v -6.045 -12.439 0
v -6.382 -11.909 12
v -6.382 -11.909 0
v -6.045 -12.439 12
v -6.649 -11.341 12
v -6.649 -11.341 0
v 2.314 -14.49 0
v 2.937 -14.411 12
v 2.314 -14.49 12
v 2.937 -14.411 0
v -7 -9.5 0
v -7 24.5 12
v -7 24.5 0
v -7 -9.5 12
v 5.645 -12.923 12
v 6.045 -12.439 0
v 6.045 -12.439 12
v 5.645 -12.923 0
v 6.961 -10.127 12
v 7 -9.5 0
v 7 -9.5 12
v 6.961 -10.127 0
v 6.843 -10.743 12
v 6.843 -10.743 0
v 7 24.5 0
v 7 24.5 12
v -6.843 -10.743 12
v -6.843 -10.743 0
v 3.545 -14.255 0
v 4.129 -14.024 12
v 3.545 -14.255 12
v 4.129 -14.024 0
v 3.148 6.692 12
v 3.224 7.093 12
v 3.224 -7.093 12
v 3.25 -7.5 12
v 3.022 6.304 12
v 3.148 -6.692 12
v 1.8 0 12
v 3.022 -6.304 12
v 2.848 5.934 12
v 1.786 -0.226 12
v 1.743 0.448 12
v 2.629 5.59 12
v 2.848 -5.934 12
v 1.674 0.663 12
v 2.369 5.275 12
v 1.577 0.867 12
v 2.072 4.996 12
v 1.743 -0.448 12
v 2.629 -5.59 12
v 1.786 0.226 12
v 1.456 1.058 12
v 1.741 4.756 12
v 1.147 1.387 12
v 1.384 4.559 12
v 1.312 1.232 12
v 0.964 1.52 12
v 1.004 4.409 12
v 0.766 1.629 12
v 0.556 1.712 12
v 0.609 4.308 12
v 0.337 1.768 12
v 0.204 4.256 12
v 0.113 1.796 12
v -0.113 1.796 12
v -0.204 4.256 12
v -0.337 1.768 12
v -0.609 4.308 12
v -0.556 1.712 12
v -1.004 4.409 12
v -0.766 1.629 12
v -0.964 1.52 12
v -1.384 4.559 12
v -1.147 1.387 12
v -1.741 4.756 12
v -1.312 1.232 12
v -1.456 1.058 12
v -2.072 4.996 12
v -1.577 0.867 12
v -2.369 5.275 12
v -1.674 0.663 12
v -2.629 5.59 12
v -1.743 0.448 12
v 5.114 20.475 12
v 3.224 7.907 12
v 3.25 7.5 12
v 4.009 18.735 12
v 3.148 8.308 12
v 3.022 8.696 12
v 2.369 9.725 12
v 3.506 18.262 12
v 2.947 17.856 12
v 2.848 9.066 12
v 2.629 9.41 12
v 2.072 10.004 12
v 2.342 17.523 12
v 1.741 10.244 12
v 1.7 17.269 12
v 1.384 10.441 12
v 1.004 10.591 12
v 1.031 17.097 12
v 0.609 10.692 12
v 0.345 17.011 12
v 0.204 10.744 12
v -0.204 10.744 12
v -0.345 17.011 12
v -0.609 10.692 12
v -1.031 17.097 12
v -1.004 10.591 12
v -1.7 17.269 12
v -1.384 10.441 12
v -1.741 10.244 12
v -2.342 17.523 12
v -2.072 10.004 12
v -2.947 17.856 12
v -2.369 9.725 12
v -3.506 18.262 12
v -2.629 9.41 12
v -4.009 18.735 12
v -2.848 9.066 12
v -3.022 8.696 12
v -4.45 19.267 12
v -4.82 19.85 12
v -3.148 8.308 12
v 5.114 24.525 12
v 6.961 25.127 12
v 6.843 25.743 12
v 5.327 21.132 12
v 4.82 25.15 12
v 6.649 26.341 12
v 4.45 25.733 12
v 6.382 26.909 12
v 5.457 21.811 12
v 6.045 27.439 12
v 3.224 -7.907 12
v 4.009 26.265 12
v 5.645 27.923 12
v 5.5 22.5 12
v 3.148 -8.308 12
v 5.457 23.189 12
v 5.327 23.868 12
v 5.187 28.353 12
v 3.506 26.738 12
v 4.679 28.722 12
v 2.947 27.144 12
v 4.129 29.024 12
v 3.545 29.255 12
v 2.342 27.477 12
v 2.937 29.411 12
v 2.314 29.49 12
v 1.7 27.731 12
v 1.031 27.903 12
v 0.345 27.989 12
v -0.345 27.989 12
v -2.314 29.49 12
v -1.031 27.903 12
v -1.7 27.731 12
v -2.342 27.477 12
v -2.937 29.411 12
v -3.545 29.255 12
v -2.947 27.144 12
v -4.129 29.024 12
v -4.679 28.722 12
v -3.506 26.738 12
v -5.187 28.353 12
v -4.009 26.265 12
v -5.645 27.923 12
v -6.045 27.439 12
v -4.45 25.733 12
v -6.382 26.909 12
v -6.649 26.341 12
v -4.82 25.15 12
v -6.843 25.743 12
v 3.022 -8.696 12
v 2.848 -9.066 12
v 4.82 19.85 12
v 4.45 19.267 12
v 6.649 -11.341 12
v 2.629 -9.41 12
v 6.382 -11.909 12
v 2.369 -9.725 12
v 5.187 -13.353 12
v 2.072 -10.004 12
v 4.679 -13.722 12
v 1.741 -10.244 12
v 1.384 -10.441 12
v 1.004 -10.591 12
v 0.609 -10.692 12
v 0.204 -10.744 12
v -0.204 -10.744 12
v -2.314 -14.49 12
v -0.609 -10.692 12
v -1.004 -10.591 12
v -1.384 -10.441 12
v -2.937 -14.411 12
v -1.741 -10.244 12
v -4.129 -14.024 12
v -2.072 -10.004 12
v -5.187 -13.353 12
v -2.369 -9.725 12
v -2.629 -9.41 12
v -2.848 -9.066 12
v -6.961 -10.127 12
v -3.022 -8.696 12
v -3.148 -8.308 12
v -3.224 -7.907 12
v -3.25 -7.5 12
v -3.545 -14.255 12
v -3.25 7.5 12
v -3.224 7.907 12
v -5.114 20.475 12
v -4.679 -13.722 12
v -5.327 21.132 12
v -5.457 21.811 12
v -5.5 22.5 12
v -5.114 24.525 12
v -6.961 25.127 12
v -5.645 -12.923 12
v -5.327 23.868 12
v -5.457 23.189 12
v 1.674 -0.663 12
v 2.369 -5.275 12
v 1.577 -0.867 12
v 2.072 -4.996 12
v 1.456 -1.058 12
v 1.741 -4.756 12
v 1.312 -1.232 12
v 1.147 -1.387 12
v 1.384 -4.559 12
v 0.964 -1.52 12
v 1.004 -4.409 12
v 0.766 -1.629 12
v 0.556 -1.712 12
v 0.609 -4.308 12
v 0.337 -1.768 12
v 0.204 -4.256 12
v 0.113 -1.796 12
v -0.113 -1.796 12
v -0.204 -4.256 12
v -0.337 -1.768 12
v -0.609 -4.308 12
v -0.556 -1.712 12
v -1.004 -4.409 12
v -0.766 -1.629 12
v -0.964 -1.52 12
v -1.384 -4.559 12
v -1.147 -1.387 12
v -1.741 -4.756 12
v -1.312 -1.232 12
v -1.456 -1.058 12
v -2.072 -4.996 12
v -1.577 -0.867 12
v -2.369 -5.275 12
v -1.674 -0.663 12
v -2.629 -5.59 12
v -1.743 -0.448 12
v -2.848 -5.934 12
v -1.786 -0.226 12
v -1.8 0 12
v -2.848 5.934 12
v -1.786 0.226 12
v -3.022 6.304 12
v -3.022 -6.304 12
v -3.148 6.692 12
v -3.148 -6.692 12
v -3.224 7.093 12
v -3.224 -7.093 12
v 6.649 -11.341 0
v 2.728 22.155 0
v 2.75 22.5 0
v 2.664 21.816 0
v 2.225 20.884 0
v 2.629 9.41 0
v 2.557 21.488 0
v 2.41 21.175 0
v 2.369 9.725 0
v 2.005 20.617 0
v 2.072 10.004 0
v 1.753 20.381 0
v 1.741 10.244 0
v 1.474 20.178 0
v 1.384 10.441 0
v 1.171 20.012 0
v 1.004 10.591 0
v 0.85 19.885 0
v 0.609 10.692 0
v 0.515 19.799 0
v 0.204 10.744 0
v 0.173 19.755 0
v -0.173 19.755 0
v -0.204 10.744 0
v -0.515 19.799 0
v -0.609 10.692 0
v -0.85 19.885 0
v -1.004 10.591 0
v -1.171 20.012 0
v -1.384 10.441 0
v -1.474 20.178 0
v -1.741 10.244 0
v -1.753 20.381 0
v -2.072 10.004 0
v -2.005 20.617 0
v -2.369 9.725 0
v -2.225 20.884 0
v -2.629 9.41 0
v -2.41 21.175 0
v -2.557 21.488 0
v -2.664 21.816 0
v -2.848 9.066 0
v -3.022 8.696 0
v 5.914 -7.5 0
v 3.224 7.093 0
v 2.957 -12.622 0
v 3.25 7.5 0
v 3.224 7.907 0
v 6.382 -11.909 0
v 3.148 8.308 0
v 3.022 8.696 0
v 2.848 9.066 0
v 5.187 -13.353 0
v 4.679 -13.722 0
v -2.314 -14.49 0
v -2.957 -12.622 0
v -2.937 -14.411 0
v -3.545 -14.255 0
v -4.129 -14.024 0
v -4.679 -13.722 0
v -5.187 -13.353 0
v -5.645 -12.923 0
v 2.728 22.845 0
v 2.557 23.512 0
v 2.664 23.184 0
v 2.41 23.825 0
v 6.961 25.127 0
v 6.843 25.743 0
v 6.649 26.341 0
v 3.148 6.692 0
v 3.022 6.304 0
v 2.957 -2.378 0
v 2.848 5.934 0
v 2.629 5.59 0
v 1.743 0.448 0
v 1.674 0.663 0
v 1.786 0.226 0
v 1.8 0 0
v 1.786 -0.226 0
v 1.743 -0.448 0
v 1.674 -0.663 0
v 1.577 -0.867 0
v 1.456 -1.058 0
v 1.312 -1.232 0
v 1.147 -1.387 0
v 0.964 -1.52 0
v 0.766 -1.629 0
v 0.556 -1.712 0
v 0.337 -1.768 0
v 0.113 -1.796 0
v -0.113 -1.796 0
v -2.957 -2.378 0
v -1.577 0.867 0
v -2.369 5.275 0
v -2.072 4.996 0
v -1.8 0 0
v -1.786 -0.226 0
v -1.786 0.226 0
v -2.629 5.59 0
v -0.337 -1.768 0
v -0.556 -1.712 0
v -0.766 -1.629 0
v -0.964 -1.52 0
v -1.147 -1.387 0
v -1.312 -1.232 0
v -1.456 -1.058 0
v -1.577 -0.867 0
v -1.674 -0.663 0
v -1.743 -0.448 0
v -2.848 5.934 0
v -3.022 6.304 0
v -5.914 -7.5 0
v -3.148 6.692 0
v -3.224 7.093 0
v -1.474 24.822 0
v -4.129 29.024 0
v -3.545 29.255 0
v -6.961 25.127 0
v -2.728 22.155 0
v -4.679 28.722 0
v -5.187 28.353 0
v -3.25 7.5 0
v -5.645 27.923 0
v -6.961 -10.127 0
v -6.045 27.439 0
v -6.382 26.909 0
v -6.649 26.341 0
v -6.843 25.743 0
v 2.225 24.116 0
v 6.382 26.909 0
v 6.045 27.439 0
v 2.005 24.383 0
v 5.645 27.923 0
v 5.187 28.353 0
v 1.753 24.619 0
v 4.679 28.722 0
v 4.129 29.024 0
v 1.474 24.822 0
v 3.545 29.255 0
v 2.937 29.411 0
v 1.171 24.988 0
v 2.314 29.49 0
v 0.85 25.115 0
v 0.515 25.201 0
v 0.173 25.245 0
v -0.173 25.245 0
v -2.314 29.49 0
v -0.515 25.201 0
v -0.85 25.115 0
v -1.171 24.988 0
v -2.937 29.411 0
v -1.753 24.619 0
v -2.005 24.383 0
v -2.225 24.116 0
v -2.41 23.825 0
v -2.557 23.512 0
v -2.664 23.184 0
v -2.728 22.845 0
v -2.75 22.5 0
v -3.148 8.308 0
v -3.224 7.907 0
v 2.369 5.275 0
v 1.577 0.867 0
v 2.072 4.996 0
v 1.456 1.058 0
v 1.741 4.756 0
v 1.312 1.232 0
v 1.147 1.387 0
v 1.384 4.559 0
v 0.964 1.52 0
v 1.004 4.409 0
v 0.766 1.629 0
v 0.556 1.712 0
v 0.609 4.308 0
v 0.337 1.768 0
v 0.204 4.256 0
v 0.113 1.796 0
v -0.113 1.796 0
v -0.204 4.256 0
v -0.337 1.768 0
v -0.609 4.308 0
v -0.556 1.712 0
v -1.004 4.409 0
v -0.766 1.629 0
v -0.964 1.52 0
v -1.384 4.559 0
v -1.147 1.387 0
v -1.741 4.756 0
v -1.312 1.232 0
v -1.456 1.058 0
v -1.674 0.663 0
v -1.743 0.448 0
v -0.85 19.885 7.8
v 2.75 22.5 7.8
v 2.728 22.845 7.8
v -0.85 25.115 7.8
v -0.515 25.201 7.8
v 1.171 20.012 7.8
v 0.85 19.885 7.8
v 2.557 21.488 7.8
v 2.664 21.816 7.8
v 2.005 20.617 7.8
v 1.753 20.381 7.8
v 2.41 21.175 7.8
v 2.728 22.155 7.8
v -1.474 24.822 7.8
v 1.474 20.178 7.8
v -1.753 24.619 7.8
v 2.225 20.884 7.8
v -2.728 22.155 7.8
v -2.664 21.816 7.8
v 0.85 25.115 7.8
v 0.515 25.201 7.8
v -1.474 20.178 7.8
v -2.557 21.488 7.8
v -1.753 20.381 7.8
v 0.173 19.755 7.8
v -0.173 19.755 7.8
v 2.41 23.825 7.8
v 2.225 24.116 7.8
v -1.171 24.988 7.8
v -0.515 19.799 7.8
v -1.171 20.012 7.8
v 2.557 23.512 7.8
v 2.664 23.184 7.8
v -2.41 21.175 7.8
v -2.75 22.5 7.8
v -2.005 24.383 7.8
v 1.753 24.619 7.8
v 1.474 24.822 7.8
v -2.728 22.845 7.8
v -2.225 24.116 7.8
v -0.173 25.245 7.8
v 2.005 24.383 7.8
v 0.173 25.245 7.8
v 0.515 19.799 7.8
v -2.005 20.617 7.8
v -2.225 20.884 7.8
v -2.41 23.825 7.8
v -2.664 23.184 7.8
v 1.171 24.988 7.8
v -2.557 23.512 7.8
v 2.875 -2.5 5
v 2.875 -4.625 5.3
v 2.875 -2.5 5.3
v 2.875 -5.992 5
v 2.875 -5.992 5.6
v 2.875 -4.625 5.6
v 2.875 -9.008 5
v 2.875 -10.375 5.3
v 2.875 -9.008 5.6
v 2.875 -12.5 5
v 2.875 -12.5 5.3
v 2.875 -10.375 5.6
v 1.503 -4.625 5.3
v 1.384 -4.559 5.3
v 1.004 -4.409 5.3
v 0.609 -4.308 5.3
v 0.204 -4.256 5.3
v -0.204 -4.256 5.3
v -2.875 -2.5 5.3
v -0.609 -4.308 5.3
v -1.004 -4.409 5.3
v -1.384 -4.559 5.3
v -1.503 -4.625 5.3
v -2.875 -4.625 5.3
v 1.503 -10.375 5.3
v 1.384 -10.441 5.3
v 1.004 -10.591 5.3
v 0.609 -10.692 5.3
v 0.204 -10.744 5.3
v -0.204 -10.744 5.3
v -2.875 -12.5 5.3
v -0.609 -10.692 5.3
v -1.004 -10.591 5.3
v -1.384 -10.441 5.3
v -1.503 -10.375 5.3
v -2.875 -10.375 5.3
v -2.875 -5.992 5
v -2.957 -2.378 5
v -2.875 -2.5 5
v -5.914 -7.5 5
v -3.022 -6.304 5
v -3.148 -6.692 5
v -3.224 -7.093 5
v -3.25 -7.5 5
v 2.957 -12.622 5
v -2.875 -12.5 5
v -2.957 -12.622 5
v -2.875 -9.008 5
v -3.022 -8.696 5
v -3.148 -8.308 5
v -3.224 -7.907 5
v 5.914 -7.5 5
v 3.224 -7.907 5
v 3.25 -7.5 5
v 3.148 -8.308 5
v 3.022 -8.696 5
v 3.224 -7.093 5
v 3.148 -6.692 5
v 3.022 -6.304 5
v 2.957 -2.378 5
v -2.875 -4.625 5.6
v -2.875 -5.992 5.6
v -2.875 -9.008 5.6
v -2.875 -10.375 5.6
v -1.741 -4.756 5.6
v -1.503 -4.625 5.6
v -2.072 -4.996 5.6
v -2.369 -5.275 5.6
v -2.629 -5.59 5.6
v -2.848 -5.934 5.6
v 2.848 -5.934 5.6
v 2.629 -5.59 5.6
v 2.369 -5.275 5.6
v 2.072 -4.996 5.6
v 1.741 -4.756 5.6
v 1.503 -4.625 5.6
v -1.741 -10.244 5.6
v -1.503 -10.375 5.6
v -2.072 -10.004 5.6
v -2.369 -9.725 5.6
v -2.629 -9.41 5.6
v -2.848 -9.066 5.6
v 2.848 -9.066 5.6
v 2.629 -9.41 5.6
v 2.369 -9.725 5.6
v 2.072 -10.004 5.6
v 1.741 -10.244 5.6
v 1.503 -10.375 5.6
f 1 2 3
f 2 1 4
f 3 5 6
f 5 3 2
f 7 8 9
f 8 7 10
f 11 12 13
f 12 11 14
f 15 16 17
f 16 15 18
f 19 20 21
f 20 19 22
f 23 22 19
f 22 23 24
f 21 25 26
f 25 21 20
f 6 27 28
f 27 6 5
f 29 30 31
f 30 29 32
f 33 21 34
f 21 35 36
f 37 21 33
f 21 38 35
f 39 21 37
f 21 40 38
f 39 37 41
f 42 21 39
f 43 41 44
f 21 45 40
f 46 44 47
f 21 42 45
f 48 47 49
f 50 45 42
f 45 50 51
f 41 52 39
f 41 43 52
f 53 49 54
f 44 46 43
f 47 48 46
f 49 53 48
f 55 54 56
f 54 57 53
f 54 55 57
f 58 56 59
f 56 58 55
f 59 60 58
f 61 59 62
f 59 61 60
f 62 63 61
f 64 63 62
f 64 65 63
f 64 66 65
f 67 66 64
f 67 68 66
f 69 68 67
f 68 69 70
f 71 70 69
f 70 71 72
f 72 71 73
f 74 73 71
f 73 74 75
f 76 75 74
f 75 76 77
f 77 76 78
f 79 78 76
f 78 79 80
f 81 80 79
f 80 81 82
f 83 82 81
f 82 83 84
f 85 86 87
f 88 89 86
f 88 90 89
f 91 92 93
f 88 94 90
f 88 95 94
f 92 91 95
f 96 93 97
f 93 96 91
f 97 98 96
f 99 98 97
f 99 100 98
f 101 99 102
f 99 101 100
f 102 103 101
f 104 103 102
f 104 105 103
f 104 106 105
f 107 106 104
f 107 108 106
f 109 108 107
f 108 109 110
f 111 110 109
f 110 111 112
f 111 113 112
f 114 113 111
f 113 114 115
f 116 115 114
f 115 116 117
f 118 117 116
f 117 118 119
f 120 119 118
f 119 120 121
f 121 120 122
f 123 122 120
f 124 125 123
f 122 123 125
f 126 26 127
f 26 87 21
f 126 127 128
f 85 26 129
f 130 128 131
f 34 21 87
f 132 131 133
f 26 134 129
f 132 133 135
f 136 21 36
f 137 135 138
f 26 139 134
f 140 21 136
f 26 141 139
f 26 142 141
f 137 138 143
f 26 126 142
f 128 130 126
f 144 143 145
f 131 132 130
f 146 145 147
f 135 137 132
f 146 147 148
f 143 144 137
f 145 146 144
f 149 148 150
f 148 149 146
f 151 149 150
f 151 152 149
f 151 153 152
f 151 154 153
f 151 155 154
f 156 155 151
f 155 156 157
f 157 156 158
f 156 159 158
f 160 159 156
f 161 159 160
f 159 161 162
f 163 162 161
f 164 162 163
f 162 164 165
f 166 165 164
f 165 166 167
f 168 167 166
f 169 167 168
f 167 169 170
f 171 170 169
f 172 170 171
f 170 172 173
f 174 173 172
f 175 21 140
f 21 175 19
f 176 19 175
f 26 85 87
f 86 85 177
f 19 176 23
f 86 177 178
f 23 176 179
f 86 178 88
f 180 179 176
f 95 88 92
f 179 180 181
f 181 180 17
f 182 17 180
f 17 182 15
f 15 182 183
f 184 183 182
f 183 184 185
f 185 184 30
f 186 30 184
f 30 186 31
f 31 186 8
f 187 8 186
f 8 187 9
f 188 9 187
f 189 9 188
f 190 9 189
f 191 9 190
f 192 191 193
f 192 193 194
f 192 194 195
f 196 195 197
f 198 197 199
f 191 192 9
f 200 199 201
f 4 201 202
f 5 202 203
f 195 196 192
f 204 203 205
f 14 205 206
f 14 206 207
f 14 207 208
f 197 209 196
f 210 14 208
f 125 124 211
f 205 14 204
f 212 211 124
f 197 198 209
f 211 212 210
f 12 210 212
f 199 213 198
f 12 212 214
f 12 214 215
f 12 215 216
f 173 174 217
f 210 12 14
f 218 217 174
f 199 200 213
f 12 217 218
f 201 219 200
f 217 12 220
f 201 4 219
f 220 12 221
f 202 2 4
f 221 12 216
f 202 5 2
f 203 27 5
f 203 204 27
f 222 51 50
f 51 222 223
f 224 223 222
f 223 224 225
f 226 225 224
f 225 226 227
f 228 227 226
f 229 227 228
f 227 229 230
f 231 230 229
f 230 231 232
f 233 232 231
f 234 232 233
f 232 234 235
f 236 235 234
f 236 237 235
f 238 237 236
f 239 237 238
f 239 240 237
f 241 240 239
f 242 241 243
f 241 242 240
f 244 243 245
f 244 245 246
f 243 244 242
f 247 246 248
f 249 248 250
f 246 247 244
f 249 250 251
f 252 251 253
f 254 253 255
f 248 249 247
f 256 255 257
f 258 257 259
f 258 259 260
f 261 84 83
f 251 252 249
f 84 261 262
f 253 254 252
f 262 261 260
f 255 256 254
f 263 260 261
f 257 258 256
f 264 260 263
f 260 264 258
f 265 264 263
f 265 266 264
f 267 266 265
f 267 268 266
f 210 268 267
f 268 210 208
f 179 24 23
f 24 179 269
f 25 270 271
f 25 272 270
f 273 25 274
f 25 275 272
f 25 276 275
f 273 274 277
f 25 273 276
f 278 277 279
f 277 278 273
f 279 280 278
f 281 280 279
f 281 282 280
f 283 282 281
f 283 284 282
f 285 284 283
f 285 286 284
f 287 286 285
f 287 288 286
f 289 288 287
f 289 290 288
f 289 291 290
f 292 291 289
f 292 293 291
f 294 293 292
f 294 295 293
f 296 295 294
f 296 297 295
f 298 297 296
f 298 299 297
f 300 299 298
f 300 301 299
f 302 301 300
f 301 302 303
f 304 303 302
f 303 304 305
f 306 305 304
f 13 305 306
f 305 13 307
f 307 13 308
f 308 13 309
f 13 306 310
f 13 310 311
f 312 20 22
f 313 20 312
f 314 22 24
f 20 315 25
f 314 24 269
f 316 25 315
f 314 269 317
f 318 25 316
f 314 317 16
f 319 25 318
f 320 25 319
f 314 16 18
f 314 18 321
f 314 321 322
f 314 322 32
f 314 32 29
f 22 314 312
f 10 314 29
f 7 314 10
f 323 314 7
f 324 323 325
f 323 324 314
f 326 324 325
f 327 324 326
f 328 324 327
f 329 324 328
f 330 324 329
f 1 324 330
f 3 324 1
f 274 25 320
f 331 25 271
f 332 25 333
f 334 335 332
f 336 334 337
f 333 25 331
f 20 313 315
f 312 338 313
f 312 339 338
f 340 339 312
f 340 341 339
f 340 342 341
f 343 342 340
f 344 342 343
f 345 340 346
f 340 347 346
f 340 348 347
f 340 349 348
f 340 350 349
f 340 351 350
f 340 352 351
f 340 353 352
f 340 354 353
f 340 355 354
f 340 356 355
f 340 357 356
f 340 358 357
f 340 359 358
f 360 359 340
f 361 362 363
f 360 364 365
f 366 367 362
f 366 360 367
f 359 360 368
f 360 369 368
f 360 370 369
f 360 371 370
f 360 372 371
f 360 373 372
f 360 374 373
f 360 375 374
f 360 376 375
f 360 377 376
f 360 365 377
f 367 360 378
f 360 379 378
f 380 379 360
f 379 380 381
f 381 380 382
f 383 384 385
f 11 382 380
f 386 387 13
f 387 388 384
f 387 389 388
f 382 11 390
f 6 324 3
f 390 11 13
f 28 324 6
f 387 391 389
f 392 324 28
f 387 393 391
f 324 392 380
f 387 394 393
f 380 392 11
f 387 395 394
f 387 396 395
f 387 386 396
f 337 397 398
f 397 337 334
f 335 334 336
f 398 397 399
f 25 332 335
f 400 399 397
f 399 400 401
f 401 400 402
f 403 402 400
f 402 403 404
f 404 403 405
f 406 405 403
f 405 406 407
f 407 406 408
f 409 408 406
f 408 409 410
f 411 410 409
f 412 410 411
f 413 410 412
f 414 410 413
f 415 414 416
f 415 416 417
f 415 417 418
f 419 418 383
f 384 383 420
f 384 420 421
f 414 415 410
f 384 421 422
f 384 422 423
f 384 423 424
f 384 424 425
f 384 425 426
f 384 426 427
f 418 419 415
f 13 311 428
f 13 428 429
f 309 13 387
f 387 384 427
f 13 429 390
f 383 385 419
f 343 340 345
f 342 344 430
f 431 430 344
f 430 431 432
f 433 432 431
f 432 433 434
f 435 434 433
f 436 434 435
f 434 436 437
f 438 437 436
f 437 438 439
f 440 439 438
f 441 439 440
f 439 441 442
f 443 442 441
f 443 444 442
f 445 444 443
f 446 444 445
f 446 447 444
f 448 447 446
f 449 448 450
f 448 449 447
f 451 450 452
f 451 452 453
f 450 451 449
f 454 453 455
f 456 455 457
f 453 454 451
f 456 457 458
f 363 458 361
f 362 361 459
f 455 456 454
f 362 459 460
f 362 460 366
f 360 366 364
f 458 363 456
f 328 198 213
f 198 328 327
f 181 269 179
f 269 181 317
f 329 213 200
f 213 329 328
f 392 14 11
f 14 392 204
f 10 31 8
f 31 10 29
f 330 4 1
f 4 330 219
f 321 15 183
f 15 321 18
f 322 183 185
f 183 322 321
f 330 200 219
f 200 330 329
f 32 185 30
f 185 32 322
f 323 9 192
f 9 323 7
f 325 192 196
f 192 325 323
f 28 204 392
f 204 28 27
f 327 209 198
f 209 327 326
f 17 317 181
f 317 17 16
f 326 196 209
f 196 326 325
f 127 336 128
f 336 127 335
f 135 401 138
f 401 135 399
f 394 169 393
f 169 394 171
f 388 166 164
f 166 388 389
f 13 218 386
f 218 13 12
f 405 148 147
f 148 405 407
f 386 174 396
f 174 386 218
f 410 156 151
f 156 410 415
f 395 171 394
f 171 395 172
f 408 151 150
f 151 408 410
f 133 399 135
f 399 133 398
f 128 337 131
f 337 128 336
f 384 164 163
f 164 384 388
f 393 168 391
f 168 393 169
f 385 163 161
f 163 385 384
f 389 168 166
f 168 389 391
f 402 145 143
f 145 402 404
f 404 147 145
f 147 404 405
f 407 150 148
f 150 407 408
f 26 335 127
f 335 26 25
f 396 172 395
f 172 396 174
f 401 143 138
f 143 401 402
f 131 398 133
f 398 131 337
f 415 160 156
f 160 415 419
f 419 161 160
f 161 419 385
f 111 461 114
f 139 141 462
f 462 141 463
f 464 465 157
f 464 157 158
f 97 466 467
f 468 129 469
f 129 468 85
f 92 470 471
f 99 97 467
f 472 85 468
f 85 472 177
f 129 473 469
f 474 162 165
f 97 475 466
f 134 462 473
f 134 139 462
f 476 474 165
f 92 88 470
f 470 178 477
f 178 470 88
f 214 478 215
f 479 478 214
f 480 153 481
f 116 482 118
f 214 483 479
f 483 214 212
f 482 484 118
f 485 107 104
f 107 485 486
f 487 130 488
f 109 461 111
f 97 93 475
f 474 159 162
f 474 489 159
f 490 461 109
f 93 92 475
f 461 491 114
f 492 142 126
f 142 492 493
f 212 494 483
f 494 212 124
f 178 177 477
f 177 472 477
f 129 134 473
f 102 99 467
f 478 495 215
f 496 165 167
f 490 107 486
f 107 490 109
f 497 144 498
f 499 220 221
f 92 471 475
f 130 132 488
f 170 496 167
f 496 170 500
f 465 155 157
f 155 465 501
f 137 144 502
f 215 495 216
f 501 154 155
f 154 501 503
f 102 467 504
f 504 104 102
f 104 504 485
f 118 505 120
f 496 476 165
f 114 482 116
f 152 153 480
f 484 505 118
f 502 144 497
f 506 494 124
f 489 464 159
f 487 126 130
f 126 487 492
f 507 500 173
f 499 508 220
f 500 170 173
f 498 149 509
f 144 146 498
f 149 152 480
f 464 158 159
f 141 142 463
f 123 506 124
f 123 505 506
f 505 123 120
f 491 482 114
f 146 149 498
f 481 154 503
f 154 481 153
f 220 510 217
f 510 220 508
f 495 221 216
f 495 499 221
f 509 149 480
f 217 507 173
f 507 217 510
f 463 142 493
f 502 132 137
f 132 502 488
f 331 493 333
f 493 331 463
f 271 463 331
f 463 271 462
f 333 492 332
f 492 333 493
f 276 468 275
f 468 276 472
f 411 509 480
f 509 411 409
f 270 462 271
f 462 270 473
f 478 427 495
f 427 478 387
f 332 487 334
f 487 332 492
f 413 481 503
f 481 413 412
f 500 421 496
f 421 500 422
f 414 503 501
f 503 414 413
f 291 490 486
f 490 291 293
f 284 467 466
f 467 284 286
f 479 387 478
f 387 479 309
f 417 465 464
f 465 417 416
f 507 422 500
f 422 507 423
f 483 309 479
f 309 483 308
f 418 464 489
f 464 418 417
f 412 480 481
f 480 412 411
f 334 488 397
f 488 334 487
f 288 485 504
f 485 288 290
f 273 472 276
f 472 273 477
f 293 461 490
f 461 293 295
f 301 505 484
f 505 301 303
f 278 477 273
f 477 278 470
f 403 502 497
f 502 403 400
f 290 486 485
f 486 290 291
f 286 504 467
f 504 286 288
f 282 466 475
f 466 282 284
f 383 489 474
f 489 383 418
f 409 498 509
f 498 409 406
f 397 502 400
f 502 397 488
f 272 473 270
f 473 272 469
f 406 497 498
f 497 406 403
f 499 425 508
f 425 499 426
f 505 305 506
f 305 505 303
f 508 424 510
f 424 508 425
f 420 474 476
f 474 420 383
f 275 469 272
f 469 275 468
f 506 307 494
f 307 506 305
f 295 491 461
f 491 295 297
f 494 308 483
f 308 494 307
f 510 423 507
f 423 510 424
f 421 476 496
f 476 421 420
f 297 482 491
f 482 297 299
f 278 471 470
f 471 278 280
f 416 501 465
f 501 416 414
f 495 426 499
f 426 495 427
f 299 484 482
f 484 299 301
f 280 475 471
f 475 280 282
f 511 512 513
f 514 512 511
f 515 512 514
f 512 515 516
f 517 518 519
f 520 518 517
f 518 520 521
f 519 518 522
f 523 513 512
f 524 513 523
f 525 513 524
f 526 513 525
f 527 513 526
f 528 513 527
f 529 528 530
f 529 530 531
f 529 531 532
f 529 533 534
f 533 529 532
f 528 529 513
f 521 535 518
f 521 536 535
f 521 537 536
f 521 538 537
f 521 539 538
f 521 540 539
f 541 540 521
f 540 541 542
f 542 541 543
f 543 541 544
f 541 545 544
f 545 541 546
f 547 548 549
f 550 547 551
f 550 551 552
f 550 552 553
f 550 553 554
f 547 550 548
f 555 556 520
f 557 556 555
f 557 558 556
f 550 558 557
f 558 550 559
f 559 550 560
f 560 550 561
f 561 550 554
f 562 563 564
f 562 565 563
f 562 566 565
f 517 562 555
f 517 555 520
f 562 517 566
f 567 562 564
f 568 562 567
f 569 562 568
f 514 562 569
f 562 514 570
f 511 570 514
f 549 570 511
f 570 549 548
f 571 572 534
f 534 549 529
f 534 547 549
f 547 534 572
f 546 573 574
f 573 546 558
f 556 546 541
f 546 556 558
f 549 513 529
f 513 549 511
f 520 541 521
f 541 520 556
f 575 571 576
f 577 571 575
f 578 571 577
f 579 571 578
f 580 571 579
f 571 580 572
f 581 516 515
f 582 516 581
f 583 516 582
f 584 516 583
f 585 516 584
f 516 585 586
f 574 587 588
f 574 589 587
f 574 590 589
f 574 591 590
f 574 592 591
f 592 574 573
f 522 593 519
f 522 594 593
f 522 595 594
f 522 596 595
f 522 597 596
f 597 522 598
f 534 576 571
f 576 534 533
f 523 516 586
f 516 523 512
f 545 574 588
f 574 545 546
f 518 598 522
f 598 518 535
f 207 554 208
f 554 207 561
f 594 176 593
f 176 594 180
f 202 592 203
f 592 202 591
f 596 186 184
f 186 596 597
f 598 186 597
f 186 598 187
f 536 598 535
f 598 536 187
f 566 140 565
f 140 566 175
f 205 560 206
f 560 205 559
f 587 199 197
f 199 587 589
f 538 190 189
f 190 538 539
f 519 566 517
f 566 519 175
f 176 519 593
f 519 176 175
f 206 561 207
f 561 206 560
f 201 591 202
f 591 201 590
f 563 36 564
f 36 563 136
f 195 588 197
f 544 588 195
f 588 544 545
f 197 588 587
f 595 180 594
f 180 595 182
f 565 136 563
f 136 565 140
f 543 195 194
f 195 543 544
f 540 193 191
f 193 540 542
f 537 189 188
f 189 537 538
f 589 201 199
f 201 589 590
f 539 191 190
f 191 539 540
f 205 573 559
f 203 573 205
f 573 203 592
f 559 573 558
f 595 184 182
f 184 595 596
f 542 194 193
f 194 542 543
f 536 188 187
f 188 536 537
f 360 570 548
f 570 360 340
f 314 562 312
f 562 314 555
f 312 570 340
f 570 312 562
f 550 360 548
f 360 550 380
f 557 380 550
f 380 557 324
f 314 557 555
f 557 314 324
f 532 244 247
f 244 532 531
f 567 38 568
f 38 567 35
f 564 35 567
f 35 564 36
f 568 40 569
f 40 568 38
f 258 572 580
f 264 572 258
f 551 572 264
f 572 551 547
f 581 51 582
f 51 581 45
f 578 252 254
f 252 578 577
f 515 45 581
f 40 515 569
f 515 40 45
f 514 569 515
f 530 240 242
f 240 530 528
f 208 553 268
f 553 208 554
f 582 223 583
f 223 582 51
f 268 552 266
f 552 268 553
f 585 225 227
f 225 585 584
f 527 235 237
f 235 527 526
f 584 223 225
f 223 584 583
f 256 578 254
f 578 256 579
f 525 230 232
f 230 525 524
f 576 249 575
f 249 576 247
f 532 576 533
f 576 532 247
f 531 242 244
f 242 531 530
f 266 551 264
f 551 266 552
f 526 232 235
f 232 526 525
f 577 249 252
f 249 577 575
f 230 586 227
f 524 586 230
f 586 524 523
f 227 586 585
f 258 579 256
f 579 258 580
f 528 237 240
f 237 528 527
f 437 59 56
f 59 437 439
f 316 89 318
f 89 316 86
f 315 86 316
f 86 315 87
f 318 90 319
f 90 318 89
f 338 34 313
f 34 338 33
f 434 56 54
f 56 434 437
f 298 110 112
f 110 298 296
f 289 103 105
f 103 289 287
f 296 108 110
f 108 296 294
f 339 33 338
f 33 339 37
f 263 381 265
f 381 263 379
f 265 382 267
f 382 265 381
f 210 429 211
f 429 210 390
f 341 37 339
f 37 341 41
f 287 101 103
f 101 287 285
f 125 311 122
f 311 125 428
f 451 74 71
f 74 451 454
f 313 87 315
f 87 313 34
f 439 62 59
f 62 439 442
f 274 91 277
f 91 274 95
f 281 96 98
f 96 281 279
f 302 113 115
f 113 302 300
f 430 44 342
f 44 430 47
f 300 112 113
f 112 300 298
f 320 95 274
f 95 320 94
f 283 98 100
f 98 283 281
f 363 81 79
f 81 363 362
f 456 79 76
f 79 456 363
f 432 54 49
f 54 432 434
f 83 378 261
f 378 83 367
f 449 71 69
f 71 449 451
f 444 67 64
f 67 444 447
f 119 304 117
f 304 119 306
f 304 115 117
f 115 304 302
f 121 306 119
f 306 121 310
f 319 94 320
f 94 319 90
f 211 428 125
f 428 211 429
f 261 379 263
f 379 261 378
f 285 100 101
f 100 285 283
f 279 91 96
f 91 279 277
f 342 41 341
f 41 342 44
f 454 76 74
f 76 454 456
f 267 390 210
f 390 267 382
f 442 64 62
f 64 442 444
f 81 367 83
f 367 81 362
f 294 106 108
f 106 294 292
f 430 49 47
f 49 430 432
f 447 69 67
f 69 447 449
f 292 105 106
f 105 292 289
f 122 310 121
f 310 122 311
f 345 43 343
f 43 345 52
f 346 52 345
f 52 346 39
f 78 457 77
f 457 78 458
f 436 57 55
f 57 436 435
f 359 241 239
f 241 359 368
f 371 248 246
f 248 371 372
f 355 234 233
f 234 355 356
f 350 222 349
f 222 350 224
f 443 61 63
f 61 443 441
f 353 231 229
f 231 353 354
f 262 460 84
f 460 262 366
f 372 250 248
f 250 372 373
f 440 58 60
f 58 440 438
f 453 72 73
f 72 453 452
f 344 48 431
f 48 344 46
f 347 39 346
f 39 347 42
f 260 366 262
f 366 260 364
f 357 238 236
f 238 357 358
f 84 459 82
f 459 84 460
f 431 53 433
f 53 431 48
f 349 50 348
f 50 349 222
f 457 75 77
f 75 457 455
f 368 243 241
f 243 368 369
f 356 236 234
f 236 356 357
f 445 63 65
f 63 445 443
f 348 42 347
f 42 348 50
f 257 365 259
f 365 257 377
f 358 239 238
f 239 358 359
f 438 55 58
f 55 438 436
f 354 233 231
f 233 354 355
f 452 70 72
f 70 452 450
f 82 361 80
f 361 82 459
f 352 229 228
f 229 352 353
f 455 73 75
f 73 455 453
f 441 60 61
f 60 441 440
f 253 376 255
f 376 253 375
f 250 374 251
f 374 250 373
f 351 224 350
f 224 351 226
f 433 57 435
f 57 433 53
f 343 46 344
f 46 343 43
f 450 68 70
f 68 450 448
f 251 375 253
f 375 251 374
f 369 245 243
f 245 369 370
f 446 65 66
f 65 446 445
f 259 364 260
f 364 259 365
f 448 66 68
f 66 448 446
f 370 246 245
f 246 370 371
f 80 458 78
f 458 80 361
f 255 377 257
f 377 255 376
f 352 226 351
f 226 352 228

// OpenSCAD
$fn = 50;


difference() {
	union() {
		hull() {
			translate(v = [-2.0000000000, 9.5000000000, 0]) {
				cylinder(h = 12, r = 5);
			}
			translate(v = [2.0000000000, 9.5000000000, 0]) {
				cylinder(h = 12, r = 5);
			}
			translate(v = [-2.0000000000, -9.5000000000, 0]) {
				cylinder(h = 12, r = 5);
			}
			translate(v = [2.0000000000, -9.5000000000, 0]) {
				cylinder(h = 12, r = 5);
			}
		}
		translate(v = [0.0000000000, 15.0000000000, 0]) {
			hull() {
				translate(v = [-2.0000000000, 9.5000000000, 0]) {
					cylinder(h = 12, r = 5);
				}
				translate(v = [2.0000000000, 9.5000000000, 0]) {
					cylinder(h = 12, r = 5);
				}
				translate(v = [-2.0000000000, -9.5000000000, 0]) {
					cylinder(h = 12, r = 5);
				}
				translate(v = [2.0000000000, -9.5000000000, 0]) {
					cylinder(h = 12, r = 5);
				}
			}
		}
		translate(v = [0.0000000000, 15.0000000000, 0]) {
			hull() {
				translate(v = [-2.0000000000, 9.5000000000, 0]) {
					cylinder(h = 12, r = 5);
				}
				translate(v = [2.0000000000, 9.5000000000, 0]) {
					cylinder(h = 12, r = 5);
				}
				translate(v = [-2.0000000000, -9.5000000000, 0]) {
					cylinder(h = 12, r = 5);
				}
				translate(v = [2.0000000000, -9.5000000000, 0]) {
					cylinder(h = 12, r = 5);
				}
			}
		}
	}
	union() {
		translate(v = [0.0000000000, 22.5000000000, 12]) {
			rotate(a = [0, 0, 0]) {
				difference() {
					union() {
						#translate(v = [0, 0, -12.0000000000]) {
							cylinder(h = 12, r = 2.2500000000);
						}
						#translate(v = [0, 0, -4.2000000000]) {
							cylinder(h = 4.2000000000, r1 = 2.7500000000, r2 = 5.5000000000);
						}
						#translate(v = [0, 0, -12.0000000000]) {
							cylinder(h = 12, r = 2.7500000000);
						}
						#translate(v = [0, 0, -12.0000000000]) {
							cylinder(h = 12, r = 2.2500000000);
						}
					}
					union();
				}
			}
		}
		translate(v = [0.0000000000, 22.5000000000, 12]) {
			rotate(a = [0, 0, 0]) {
				difference() {
					union() {
						#translate(v = [0, 0, -12.0000000000]) {
							cylinder(h = 12, r = 2.2500000000);
						}
						#translate(v = [0, 0, -4.2000000000]) {
							cylinder(h = 4.2000000000, r1 = 2.7500000000, r2 = 5.5000000000);
						}
						#translate(v = [0, 0, -12.0000000000]) {
							cylinder(h = 12, r = 2.7500000000);
						}
						#translate(v = [0, 0, -12.0000000000]) {
							cylinder(h = 12, r = 2.2500000000);
						}
					}
					union();
				}
			}
		}
		translate(v = [0.0000000000, -7.5000000000, 0]) {
			rotate(a = [0, 0, 0]) {
				difference() {
					union() {
						#translate(v = [-2.8750000000, -5.0000000000, -0.3000000000]) {
							cube(size = [5.7500000000, 10, 0.3000000000]);
						}
						#translate(v = [-2.8750000000, -2.8750000000, -0.6000000000]) {
							cube(size = [5.7500000000, 5.7500000000, 0.3000000000]);
						}
						#translate(v = [-2.8750000000, -5.0000000000, 5]) {
							cube(size = [5.7500000000, 10, 0.3000000000]);
						}
						#translate(v = [-2.8750000000, -2.8750000000, 5.3000000000]) {
							cube(size = [5.7500000000, 5.7500000000, 0.3000000000]);
						}
						#translate(v = [0, 0, -100.0000000000]) {
							cylinder(h = 200, r = 3.2500000000);
						}
						#linear_extrude(height = 5) {
							polygon(points = [[5.9142500000, 0.0000000000], [2.9571250000, 5.1218907443], [-2.9571250000, 5.1218907443], [-5.9142500000, 0.0000000000], [-2.9571250000, -5.1218907443], [2.9571250000, -5.1218907443]]);
						}
						#translate(v = [-2.8750000000, -5.0000000000, -0.3000000000]) {
							cube(size = [5.7500000000, 10, 0.3000000000]);
						}
						#translate(v = [-2.8750000000, -2.8750000000, -0.6000000000]) {
							cube(size = [5.7500000000, 5.7500000000, 0.3000000000]);
						}
						#translate(v = [-2.8750000000, -5.0000000000, 5]) {
							cube(size = [5.7500000000, 10, 0.3000000000]);
						}
						#translate(v = [-2.8750000000, -2.8750000000, 5.3000000000]) {
							cube(size = [5.7500000000, 5.7500000000, 0.3000000000]);
						}
						#translate(v = [0, 0, -100.0000000000]) {
							cylinder(h = 200, r = 3.2500000000);
						}
						#translate(v = [-2.8750000000, -5.0000000000, -0.3000000000]) {
							cube(size = [5.7500000000, 10, 0.3000000000]);
						}
						#translate(v = [-2.8750000000, -2.8750000000, -0.6000000000]) {
							cube(size = [5.7500000000, 5.7500000000, 0.3000000000]);
						}
						#translate(v = [-2.8750000000, -5.0000000000, 5]) {
							cube(size = [5.7500000000, 10, 0.3000000000]);
						}
						#translate(v = [-2.8750000000, -2.8750000000, 5.3000000000]) {
							cube(size = [5.7500000000, 5.7500000000, 0.3000000000]);
						}
						#translate(v = [0, 0, -100.0000000000]) {
							cylinder(h = 200, r = 3.2500000000);
						}
					}
					union();
				}
			}
		}
		translate(v = [0.0000000000, -7.5000000000, 0]) {
			translate(v = [0, 0, -100]) {
				cylinder(h = 200, r = 3.2500000000);
			}
		}
		translate(v = [0.0000000000, 7.5000000000, 0]) {
			translate(v = [0, 0, -100]) {
				cylinder(h = 200, r = 3.2500000000);
			}
		}
		translate(v = [0.0000000000, -7.5000000000, 0]) {
			translate(v = [0, 0, -100]) {
				cylinder(h = 200, r = 1.8000000000);
			}
		}
		translate(v = [0, 0, -100]) {
			cylinder(h = 200, r = 1.8000000000);
		}
		translate(v = [0.0000000000, 7.5000000000, 0]) {
			translate(v = [0, 0, -100]) {
				cylinder(h = 200, r = 1.8000000000);
			}
		}
	}
}
